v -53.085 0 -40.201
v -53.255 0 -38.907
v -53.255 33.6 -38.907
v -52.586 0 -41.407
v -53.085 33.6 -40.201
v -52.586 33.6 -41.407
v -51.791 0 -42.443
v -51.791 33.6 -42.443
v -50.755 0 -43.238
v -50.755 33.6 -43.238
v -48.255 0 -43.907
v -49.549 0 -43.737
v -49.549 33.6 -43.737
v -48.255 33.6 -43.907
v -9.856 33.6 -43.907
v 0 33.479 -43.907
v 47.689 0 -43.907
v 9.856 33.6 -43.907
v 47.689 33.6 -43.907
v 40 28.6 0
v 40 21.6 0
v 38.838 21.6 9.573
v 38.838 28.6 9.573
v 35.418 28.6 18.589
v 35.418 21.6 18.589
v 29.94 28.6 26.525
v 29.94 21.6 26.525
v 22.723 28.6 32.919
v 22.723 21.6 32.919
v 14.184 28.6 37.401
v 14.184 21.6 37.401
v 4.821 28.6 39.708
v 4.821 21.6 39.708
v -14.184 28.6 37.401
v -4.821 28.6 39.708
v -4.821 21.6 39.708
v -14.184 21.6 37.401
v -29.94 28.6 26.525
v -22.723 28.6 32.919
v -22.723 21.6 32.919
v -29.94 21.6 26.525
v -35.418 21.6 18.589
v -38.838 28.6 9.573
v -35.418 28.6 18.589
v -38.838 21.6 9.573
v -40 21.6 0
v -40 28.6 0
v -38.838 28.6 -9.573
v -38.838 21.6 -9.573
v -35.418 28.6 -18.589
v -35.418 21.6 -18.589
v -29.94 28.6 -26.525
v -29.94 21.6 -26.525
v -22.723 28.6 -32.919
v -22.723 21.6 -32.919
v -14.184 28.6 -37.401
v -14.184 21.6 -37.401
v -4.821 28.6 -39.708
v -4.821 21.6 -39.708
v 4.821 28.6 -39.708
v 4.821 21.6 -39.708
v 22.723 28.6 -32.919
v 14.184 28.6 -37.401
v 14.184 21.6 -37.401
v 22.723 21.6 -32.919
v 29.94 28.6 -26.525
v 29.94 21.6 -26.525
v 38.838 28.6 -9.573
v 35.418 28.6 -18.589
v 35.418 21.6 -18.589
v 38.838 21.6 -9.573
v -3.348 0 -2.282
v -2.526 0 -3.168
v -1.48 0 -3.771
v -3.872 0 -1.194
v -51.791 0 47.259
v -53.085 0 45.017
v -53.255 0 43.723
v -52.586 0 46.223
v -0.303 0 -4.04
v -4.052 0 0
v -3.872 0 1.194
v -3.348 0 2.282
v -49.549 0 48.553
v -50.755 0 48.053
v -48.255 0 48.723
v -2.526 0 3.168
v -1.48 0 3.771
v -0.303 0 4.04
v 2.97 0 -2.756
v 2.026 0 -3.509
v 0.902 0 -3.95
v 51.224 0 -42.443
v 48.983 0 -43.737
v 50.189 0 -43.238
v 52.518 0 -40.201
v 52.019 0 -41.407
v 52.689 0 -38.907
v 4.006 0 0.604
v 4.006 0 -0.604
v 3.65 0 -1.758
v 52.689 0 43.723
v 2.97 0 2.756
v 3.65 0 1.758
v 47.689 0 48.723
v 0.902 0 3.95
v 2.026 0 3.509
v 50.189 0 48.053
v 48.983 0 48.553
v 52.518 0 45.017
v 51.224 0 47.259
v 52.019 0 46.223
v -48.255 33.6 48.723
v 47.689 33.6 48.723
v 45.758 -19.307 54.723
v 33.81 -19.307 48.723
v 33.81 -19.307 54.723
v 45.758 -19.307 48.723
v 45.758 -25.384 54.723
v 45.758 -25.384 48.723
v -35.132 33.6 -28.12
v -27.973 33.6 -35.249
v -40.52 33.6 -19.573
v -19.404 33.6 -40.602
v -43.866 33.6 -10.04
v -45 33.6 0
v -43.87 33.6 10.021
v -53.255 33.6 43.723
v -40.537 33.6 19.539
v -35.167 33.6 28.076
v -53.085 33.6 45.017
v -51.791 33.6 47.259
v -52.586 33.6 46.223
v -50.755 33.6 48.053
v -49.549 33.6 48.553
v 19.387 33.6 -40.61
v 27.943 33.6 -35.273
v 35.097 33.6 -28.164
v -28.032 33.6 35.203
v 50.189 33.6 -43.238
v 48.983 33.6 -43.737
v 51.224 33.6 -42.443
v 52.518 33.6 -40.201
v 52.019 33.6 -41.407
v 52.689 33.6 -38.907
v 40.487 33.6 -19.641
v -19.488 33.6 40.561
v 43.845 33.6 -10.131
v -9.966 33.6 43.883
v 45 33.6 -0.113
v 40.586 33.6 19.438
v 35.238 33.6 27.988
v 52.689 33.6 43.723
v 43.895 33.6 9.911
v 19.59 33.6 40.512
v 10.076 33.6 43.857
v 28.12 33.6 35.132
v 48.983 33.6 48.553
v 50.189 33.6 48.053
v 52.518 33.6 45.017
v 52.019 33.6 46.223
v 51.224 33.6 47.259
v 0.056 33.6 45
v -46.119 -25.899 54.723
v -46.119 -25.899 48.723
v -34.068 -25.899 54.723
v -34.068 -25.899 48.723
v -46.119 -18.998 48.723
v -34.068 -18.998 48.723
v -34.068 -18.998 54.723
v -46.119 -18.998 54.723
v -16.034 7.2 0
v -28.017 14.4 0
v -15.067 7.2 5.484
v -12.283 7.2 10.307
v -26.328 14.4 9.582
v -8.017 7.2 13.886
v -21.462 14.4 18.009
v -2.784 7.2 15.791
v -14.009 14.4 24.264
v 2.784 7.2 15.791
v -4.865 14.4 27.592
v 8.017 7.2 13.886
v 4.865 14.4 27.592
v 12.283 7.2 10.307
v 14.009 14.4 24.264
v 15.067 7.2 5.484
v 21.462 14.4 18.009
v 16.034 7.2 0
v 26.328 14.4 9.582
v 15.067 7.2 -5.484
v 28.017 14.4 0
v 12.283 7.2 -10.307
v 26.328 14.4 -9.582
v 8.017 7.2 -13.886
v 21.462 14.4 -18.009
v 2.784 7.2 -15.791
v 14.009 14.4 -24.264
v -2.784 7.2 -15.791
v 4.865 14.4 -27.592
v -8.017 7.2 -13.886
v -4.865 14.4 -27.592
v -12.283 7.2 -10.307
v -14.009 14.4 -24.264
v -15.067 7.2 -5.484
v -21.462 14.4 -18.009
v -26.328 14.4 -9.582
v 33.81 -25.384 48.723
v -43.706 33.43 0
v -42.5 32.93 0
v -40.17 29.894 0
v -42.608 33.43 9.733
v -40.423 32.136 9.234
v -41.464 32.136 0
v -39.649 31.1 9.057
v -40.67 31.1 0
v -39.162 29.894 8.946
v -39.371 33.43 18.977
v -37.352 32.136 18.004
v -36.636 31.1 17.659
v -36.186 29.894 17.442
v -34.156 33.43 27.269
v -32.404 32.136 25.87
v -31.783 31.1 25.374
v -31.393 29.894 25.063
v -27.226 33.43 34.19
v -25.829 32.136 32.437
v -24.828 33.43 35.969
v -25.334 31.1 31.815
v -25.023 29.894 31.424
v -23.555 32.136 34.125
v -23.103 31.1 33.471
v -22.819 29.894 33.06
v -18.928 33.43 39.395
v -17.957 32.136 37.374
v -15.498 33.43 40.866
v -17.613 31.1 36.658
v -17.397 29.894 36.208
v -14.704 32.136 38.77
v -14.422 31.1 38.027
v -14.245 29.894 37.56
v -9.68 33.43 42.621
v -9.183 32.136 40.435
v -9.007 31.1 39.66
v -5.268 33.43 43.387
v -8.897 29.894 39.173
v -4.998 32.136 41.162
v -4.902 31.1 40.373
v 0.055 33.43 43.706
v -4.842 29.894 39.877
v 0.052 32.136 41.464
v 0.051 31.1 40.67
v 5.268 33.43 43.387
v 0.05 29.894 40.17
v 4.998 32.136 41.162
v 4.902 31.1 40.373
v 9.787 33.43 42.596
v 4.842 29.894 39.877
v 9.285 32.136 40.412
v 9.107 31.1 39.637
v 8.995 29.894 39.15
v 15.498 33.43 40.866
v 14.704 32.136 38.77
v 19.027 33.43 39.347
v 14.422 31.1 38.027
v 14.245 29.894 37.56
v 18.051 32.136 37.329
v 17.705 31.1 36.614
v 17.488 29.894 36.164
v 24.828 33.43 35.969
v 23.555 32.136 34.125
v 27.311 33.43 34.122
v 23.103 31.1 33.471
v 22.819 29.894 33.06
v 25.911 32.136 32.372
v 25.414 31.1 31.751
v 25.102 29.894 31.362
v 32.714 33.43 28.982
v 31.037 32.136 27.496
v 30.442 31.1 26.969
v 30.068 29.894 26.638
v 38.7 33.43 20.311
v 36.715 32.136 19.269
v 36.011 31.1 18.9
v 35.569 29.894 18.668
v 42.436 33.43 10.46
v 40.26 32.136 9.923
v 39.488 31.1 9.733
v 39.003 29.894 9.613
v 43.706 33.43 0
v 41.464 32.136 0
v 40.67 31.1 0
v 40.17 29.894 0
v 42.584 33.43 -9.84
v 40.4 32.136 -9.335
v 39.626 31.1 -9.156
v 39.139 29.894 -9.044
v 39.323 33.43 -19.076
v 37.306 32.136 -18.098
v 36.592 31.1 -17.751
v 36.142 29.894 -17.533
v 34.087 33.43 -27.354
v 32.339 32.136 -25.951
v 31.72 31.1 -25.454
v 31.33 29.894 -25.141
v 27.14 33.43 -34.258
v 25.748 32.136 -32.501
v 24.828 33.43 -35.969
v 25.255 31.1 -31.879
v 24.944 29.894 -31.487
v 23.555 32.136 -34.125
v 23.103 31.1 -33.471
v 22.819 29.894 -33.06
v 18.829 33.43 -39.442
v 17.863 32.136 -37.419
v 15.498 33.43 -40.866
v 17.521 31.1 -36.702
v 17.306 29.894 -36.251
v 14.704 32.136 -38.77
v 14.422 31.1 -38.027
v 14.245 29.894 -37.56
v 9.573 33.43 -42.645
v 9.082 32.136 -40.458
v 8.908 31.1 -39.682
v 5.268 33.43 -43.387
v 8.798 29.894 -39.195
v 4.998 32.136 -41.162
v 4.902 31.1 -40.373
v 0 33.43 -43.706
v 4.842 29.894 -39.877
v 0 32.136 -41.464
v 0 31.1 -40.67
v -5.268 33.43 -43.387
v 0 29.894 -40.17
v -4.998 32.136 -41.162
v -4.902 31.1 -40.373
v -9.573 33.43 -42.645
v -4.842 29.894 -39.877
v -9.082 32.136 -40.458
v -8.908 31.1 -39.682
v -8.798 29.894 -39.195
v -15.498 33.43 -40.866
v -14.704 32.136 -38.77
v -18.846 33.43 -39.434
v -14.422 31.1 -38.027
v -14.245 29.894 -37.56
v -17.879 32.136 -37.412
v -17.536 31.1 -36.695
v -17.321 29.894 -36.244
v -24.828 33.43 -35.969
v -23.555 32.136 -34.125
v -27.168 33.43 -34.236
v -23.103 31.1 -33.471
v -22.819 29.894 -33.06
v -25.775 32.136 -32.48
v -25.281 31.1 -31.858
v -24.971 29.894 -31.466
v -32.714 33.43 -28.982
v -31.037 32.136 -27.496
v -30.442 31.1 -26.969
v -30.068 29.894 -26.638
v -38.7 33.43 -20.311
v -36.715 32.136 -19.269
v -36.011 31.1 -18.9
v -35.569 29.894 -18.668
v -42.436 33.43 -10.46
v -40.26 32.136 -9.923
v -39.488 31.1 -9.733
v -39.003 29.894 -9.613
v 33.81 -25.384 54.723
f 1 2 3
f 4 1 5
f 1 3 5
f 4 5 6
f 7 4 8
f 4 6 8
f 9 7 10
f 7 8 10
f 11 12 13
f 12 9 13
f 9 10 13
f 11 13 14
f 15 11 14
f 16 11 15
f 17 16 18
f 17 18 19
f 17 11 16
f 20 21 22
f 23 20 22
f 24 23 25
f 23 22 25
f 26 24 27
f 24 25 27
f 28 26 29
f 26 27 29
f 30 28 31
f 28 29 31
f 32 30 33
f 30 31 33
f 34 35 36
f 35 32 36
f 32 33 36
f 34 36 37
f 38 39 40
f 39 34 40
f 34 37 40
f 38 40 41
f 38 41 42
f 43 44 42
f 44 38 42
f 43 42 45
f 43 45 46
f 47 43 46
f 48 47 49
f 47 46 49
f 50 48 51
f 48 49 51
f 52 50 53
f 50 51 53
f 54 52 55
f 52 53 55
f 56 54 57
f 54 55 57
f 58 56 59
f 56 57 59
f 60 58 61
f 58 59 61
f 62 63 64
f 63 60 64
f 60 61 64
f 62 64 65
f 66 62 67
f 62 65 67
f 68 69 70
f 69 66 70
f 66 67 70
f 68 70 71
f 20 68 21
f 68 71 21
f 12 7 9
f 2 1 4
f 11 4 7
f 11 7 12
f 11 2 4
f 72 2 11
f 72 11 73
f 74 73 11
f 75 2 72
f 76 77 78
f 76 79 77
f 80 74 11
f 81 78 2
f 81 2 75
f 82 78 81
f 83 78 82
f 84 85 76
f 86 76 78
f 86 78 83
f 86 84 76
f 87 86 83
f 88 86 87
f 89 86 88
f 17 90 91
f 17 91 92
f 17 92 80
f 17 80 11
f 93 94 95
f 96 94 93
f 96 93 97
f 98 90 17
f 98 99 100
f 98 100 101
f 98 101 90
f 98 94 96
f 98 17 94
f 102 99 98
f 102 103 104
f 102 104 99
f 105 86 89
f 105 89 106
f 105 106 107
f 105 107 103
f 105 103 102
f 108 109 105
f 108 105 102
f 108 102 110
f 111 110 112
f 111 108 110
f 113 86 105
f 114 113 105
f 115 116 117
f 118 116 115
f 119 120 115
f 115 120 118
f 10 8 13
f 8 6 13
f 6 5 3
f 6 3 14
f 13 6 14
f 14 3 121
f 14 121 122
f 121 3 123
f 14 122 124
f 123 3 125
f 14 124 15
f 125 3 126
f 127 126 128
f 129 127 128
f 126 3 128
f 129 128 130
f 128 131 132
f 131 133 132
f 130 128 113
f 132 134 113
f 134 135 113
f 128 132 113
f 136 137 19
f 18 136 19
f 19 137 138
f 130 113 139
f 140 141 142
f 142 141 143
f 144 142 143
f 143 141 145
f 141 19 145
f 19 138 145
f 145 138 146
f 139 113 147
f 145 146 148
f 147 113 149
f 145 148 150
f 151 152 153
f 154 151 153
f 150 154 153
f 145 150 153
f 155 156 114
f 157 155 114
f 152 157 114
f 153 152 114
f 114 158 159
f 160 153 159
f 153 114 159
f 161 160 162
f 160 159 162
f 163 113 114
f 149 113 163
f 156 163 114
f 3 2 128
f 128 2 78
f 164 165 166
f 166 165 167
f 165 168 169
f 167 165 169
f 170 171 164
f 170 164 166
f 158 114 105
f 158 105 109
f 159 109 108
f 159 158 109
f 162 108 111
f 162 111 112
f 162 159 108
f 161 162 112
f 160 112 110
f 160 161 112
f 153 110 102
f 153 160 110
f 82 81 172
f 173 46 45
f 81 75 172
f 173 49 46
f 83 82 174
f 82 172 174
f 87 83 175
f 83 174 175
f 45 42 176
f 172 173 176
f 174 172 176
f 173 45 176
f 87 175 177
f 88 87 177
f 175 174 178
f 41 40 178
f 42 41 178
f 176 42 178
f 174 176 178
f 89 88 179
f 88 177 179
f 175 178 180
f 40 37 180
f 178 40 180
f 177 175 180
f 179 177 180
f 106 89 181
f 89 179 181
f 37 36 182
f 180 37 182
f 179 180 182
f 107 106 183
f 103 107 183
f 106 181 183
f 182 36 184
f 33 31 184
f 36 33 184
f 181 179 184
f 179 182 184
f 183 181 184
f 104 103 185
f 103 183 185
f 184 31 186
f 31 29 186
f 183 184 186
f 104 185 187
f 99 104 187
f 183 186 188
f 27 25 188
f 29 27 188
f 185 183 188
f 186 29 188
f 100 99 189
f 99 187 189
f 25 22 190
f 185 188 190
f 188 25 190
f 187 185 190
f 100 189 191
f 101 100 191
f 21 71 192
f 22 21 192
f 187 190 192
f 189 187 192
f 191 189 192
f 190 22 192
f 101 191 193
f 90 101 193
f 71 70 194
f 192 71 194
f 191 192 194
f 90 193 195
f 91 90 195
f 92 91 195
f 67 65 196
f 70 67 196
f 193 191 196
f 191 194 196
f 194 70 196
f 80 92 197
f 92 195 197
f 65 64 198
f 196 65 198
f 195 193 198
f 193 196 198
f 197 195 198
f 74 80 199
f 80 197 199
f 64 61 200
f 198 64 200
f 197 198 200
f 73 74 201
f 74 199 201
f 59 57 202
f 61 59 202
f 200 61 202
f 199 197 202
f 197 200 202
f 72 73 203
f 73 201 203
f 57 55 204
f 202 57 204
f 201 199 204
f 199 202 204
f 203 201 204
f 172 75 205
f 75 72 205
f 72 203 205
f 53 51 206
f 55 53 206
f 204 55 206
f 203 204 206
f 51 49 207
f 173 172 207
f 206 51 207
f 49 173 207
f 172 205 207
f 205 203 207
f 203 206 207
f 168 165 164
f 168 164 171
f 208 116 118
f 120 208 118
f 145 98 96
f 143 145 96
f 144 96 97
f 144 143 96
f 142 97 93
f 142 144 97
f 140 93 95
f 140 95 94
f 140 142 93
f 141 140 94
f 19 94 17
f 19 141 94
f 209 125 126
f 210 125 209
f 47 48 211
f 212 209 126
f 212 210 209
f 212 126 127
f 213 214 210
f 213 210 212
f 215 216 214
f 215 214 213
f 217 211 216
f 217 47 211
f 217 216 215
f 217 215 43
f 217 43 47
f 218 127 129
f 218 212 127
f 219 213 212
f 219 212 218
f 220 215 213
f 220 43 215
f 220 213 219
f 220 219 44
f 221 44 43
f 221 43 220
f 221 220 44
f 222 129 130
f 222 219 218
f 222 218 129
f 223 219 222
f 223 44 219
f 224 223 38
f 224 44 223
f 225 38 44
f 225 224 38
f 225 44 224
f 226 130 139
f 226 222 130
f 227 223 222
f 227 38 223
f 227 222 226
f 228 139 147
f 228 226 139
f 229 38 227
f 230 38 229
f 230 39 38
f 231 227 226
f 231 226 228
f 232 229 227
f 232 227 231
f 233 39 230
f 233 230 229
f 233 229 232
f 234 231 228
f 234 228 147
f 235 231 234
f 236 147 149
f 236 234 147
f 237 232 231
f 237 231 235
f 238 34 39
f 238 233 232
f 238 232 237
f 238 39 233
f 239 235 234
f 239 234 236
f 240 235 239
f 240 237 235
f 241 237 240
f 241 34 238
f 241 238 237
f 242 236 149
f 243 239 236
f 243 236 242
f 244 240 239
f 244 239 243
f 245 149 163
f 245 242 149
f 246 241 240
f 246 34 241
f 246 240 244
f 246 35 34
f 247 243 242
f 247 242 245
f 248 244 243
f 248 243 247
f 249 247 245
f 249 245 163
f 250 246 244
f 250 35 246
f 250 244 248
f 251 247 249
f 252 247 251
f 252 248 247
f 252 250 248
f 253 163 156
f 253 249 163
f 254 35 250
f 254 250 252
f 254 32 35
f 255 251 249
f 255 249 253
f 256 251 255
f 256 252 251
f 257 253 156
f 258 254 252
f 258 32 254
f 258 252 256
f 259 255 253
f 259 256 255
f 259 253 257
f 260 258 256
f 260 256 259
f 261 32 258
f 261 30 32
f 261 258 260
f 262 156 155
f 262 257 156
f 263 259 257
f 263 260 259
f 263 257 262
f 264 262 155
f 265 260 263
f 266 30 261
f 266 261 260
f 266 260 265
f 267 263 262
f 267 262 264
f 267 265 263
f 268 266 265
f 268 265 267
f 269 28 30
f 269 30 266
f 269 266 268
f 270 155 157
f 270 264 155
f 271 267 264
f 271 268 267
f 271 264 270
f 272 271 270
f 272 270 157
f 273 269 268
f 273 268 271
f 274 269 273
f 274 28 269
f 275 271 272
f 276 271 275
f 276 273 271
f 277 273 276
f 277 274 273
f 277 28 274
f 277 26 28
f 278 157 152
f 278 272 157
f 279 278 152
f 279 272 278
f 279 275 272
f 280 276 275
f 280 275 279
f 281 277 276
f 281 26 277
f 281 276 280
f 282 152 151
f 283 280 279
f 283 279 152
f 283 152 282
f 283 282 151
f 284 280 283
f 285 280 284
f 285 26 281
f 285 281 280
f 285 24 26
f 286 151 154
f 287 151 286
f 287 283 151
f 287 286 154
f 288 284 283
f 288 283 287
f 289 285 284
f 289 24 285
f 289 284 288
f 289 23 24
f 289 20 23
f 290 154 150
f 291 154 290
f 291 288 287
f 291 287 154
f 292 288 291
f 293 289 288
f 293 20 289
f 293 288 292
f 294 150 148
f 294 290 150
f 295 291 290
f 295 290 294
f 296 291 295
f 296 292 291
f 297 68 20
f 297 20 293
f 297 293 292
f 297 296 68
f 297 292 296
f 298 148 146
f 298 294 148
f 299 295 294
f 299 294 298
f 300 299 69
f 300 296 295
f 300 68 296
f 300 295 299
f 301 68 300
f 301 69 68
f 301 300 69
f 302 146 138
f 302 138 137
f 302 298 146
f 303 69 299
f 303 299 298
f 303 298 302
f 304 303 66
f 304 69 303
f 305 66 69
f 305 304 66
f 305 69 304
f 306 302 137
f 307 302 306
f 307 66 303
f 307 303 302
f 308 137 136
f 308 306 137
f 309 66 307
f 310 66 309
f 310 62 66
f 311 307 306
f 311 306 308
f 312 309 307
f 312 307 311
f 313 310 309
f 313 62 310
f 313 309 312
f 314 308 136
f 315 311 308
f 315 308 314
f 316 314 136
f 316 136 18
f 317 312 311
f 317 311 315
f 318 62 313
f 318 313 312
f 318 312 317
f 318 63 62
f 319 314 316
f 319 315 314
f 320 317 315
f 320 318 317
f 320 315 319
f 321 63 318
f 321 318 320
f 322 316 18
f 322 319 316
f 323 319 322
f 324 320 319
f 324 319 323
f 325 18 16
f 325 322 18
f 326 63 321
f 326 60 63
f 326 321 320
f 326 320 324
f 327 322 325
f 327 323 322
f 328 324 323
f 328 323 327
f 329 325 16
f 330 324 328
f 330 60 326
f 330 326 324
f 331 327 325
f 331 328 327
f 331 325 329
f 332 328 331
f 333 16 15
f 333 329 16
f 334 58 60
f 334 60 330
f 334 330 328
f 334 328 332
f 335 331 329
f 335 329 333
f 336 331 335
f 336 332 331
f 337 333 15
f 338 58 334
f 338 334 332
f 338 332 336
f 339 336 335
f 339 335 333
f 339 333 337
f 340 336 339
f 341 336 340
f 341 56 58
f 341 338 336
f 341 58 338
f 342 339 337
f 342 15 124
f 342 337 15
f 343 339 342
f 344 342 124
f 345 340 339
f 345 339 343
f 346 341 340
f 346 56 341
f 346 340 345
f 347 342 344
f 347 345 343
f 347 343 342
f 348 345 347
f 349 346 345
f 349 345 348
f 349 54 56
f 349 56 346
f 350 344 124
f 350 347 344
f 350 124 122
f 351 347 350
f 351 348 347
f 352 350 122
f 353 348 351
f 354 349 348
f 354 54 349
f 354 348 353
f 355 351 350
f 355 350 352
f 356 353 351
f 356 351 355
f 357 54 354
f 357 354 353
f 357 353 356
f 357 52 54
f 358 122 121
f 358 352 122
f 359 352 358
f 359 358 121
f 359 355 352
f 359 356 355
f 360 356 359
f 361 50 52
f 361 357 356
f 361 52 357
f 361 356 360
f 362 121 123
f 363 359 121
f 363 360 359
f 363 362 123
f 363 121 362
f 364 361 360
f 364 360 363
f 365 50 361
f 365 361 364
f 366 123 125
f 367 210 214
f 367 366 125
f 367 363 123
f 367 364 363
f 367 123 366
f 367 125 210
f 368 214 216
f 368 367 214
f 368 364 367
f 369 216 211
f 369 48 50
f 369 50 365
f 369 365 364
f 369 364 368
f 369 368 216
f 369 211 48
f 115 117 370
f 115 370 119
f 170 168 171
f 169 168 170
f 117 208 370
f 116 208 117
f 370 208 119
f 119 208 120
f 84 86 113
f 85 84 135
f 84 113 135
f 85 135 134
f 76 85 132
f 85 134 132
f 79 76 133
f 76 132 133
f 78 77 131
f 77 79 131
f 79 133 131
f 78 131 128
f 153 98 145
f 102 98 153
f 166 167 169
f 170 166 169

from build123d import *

# Parameters (mm, degrees)
F0_W        = 105.944249779
F0_H        = 92.6303975284
F1_DEPTH    = 33.6
F3_D        = 80
F3_DEPTH    = 12
F3_TIP      = 24.0344247611
F4_T1_DEPTH = 58.6
F5_W        = 12.0511576533
F5_H        = 6.9010909647
F6_DEPTH    = 6
F5_W_2      = 11.9481608272
F5_H_2      = 6.0770791024


# Not quite as in the source:
# - a fillet or chamfer that OpenCascade refuses, or shapes differently, is made with other operations: its cross-section is extruded or revolved along the edge and cut away or added


with BuildPart() as f1:
    # F0 (on Front) → F1 (new body)
    with BuildSketch(Plane.XZ):
        with Locations((-0.2832729369, 2.4078246206)):
            Rectangle(F0_W, F0_H)
    extrude(amount=-F1_DEPTH)

    # F3
    with Locations(Plane(origin=(0, 33.6, 0), x_dir=(-1, 0, 0), z_dir=(0, 1, 0))):
        with Locations((0, 0)):
            Hole(F3_D / 2, depth=F3_DEPTH)
            with Locations((0, 0, -(F3_DEPTH + F3_TIP / 2))):  # 118° drill point
                Cone(0, F3_D / 2, F3_TIP, mode=Mode.SUBTRACT)

    # F4: fillet of radius 5 on 5 edges, made by hand

    # F4_s2 → F4_t1 (cut)
    with BuildSketch(Plane.XZ.offset(-46.1)):
        with BuildLine():
            ThreePointArc((47.6888519526, 48.7230233848), (51.2243858585, 47.2585572907), (52.6888519526, 43.7230233848))
            Line((52.6888519526, 43.7230233848), (52.6888519526, 48.7230233848))
            Line((52.6888519526, 48.7230233848), (47.6888519526, 48.7230233848))
        make_face()
        with BuildLine():
            ThreePointArc((-48.2553978264, 48.7230233848), (-51.7909317324, 47.2585572907), (-53.2553978264, 43.7230233848))
            Line((-53.2553978264, 43.7230233848), (-53.2553978264, 48.7230233848))
            Line((-53.2553978264, 48.7230233848), (-48.2553978264, 48.7230233848))
        make_face()
        with BuildLine():
            ThreePointArc((-53.2553978264, -38.9073741436), (-51.7909317324, -42.4429080495), (-48.2553978264, -43.9073741436))
            Line((-48.2553978264, -43.9073741436), (-53.2553978264, -43.9073741436))
            Line((-53.2553978264, -43.9073741436), (-53.2553978264, -38.9073741436))
        make_face()
        with BuildLine():
            ThreePointArc((52.6888519526, -38.9073741436), (51.2243858585, -42.4429080495), (47.6888519526, -43.9073741436))
            Line((47.6888519526, -43.9073741436), (52.6888519526, -43.9073741436))
            Line((52.6888519526, -43.9073741436), (52.6888519526, -38.9073741436))
        make_face()
    extrude(amount=F4_T1_DEPTH, mode=Mode.SUBTRACT)

    # F4_s3 → F4_t4 (revolve, cut)
    with BuildSketch(Plane.XY):
        with BuildLine():
            ThreePointArc((-45, 33.6), (-41.4644660941, 32.1355339059), (-40, 28.6))
            Line((-40, 28.6), (-40, 33.6))
            Line((-40, 33.6), (-45, 33.6))
        make_face()
    revolve(axis=Axis((0, 33.6, 0), (0, 1, 0)), mode=Mode.SUBTRACT)


with BuildPart() as f6:
    # F5 (on face) → F6 (new body)
    with BuildSketch(Plane.XY.offset(48.7230233848)):
        with Locations((-40.0932952762, -22.448499687)):
            Rectangle(F5_W, F5_H)
    extrude(amount=F6_DEPTH)


with BuildPart() as f6b:
    # F5 (on face) → F6, piece 2 (new body)
    with BuildSketch(Plane.XY.offset(48.7230233848)):
        with Locations((39.7842526436, -22.3454991356)):
            Rectangle(F5_W_2, F5_H_2)
    extrude(amount=F6_DEPTH)


solid = Compound([f1.part, f6.part, f6b.part])
